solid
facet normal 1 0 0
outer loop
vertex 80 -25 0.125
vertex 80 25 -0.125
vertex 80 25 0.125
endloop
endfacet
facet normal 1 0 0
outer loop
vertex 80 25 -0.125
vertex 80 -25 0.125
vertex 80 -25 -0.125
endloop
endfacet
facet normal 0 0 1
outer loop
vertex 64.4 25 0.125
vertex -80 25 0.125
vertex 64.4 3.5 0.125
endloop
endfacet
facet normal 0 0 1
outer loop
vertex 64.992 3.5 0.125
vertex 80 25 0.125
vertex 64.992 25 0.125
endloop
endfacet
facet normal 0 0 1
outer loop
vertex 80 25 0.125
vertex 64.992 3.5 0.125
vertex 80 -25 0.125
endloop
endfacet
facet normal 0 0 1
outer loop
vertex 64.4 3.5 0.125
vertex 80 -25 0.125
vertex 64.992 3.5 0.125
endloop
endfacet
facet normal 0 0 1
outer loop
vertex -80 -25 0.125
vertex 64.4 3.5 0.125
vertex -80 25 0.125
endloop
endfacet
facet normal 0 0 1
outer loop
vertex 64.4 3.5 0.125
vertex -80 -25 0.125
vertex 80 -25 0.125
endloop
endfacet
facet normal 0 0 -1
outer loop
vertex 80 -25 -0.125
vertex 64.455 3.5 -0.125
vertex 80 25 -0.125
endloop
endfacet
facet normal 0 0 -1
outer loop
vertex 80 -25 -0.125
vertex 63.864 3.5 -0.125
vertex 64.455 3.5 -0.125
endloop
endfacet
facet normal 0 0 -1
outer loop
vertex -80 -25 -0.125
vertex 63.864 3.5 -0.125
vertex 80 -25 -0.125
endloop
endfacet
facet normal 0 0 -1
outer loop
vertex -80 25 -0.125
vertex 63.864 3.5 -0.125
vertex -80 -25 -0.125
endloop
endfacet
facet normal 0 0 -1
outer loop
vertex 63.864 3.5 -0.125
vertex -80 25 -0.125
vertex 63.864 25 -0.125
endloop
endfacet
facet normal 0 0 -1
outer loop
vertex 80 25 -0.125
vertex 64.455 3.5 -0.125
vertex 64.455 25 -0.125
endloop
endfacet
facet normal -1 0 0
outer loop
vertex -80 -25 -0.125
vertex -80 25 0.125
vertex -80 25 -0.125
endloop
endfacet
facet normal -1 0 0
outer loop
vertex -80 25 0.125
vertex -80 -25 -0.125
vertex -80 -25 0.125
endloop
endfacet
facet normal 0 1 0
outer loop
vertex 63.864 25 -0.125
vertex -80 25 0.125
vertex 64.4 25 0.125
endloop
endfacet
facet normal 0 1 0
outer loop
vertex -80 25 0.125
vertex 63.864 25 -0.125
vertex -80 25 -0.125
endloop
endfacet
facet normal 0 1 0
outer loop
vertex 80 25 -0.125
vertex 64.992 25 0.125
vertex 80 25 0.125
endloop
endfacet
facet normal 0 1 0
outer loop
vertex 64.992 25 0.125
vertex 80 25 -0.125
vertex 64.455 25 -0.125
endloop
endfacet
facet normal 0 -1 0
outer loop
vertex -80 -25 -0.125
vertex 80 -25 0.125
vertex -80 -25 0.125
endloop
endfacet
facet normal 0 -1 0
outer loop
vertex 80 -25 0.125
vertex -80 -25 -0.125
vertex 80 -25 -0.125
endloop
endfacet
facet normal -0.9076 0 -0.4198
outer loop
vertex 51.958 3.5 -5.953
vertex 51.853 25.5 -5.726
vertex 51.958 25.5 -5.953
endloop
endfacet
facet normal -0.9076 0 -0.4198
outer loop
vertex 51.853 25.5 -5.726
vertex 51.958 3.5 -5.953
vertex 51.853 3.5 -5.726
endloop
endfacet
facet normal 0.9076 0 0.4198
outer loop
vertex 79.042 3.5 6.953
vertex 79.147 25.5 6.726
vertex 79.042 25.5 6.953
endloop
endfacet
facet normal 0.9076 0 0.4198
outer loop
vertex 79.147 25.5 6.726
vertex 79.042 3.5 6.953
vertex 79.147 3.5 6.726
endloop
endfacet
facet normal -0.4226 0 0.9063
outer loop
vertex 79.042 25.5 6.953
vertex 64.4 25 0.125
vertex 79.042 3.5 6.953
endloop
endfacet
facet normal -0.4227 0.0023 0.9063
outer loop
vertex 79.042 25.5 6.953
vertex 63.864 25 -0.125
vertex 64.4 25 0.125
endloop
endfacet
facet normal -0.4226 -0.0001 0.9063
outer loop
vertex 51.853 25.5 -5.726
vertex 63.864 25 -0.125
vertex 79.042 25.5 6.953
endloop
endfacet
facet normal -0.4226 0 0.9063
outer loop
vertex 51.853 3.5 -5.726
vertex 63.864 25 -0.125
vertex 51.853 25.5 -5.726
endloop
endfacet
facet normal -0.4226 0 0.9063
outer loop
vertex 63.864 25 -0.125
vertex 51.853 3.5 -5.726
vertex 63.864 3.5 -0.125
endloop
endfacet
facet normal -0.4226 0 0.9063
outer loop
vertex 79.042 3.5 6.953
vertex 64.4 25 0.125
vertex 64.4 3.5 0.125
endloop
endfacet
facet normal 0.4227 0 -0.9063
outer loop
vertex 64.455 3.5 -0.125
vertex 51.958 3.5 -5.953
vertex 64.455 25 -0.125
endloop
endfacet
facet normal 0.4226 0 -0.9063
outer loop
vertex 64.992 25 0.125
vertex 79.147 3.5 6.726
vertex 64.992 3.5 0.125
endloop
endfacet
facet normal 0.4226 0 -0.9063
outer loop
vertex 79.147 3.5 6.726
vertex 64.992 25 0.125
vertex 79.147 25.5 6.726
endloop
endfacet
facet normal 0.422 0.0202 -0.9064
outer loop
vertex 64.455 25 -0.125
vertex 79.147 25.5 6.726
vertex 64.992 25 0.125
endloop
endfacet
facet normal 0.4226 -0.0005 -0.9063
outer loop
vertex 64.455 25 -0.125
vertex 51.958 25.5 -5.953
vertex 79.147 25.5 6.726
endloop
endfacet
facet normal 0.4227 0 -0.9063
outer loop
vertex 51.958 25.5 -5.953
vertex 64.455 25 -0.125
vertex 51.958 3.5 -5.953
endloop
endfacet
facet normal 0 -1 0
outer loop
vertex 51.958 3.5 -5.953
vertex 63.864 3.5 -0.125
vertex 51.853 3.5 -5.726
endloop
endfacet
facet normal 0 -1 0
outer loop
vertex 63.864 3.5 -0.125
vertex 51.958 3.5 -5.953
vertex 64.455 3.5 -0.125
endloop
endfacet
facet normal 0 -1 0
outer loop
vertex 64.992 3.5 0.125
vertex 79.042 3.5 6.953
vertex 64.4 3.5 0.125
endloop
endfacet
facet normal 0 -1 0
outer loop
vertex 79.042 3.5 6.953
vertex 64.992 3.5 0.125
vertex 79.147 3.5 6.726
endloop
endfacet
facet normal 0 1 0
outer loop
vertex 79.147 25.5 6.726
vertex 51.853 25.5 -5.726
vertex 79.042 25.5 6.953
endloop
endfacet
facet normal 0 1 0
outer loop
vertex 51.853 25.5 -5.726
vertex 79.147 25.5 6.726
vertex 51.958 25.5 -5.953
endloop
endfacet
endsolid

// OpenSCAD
$fn = 128;

// A sheet: Sellotape tape (flat strip)
// Simple, recognizable: a thin rectangular tape sheet with a small folded/peeled corner.
// Single connected solid, with slight overlaps for watertight union.

tape_len   = 160;   // length of sheet (mm)
tape_w     = 50;    // width of sheet (mm)
tape_th    = 0.25;  // thickness of tape sheet (mm) - thin but printable-ish
overlap    = 1.0;   // overlap to guarantee solid connection (mm)

// Peeled corner (folded flap) parameters
flap_len   = 30;    // length of peeled corner along tape length (mm)
flap_w     = 22;    // width of peeled corner along tape width (mm)
flap_th    = tape_th;
flap_angle = 25;    // degrees lifted

module sellotape_sheet() {
    union() {
        // Main flat sheet (centered)
        cube([tape_len, tape_w, tape_th], center=true);

        // Peeled/folded corner flap: attached at one corner with overlap
        // Place flap so its inner corner overlaps the main sheet corner by 'overlap'
        // Main sheet extents: x = ±tape_len/2, y = ±tape_w/2, z = ±tape_th/2
        translate([
            tape_len/2 - flap_len/2 + overlap/2,
            tape_w/2 - flap_w/2 + overlap/2,
            tape_th/2 - flap_th/2 + overlap/2
        ])
        rotate([0, -flap_angle, 0])  // lift the corner upward
        cube([flap_len, flap_w, flap_th], center=true);
    }
}

sellotape_sheet();
